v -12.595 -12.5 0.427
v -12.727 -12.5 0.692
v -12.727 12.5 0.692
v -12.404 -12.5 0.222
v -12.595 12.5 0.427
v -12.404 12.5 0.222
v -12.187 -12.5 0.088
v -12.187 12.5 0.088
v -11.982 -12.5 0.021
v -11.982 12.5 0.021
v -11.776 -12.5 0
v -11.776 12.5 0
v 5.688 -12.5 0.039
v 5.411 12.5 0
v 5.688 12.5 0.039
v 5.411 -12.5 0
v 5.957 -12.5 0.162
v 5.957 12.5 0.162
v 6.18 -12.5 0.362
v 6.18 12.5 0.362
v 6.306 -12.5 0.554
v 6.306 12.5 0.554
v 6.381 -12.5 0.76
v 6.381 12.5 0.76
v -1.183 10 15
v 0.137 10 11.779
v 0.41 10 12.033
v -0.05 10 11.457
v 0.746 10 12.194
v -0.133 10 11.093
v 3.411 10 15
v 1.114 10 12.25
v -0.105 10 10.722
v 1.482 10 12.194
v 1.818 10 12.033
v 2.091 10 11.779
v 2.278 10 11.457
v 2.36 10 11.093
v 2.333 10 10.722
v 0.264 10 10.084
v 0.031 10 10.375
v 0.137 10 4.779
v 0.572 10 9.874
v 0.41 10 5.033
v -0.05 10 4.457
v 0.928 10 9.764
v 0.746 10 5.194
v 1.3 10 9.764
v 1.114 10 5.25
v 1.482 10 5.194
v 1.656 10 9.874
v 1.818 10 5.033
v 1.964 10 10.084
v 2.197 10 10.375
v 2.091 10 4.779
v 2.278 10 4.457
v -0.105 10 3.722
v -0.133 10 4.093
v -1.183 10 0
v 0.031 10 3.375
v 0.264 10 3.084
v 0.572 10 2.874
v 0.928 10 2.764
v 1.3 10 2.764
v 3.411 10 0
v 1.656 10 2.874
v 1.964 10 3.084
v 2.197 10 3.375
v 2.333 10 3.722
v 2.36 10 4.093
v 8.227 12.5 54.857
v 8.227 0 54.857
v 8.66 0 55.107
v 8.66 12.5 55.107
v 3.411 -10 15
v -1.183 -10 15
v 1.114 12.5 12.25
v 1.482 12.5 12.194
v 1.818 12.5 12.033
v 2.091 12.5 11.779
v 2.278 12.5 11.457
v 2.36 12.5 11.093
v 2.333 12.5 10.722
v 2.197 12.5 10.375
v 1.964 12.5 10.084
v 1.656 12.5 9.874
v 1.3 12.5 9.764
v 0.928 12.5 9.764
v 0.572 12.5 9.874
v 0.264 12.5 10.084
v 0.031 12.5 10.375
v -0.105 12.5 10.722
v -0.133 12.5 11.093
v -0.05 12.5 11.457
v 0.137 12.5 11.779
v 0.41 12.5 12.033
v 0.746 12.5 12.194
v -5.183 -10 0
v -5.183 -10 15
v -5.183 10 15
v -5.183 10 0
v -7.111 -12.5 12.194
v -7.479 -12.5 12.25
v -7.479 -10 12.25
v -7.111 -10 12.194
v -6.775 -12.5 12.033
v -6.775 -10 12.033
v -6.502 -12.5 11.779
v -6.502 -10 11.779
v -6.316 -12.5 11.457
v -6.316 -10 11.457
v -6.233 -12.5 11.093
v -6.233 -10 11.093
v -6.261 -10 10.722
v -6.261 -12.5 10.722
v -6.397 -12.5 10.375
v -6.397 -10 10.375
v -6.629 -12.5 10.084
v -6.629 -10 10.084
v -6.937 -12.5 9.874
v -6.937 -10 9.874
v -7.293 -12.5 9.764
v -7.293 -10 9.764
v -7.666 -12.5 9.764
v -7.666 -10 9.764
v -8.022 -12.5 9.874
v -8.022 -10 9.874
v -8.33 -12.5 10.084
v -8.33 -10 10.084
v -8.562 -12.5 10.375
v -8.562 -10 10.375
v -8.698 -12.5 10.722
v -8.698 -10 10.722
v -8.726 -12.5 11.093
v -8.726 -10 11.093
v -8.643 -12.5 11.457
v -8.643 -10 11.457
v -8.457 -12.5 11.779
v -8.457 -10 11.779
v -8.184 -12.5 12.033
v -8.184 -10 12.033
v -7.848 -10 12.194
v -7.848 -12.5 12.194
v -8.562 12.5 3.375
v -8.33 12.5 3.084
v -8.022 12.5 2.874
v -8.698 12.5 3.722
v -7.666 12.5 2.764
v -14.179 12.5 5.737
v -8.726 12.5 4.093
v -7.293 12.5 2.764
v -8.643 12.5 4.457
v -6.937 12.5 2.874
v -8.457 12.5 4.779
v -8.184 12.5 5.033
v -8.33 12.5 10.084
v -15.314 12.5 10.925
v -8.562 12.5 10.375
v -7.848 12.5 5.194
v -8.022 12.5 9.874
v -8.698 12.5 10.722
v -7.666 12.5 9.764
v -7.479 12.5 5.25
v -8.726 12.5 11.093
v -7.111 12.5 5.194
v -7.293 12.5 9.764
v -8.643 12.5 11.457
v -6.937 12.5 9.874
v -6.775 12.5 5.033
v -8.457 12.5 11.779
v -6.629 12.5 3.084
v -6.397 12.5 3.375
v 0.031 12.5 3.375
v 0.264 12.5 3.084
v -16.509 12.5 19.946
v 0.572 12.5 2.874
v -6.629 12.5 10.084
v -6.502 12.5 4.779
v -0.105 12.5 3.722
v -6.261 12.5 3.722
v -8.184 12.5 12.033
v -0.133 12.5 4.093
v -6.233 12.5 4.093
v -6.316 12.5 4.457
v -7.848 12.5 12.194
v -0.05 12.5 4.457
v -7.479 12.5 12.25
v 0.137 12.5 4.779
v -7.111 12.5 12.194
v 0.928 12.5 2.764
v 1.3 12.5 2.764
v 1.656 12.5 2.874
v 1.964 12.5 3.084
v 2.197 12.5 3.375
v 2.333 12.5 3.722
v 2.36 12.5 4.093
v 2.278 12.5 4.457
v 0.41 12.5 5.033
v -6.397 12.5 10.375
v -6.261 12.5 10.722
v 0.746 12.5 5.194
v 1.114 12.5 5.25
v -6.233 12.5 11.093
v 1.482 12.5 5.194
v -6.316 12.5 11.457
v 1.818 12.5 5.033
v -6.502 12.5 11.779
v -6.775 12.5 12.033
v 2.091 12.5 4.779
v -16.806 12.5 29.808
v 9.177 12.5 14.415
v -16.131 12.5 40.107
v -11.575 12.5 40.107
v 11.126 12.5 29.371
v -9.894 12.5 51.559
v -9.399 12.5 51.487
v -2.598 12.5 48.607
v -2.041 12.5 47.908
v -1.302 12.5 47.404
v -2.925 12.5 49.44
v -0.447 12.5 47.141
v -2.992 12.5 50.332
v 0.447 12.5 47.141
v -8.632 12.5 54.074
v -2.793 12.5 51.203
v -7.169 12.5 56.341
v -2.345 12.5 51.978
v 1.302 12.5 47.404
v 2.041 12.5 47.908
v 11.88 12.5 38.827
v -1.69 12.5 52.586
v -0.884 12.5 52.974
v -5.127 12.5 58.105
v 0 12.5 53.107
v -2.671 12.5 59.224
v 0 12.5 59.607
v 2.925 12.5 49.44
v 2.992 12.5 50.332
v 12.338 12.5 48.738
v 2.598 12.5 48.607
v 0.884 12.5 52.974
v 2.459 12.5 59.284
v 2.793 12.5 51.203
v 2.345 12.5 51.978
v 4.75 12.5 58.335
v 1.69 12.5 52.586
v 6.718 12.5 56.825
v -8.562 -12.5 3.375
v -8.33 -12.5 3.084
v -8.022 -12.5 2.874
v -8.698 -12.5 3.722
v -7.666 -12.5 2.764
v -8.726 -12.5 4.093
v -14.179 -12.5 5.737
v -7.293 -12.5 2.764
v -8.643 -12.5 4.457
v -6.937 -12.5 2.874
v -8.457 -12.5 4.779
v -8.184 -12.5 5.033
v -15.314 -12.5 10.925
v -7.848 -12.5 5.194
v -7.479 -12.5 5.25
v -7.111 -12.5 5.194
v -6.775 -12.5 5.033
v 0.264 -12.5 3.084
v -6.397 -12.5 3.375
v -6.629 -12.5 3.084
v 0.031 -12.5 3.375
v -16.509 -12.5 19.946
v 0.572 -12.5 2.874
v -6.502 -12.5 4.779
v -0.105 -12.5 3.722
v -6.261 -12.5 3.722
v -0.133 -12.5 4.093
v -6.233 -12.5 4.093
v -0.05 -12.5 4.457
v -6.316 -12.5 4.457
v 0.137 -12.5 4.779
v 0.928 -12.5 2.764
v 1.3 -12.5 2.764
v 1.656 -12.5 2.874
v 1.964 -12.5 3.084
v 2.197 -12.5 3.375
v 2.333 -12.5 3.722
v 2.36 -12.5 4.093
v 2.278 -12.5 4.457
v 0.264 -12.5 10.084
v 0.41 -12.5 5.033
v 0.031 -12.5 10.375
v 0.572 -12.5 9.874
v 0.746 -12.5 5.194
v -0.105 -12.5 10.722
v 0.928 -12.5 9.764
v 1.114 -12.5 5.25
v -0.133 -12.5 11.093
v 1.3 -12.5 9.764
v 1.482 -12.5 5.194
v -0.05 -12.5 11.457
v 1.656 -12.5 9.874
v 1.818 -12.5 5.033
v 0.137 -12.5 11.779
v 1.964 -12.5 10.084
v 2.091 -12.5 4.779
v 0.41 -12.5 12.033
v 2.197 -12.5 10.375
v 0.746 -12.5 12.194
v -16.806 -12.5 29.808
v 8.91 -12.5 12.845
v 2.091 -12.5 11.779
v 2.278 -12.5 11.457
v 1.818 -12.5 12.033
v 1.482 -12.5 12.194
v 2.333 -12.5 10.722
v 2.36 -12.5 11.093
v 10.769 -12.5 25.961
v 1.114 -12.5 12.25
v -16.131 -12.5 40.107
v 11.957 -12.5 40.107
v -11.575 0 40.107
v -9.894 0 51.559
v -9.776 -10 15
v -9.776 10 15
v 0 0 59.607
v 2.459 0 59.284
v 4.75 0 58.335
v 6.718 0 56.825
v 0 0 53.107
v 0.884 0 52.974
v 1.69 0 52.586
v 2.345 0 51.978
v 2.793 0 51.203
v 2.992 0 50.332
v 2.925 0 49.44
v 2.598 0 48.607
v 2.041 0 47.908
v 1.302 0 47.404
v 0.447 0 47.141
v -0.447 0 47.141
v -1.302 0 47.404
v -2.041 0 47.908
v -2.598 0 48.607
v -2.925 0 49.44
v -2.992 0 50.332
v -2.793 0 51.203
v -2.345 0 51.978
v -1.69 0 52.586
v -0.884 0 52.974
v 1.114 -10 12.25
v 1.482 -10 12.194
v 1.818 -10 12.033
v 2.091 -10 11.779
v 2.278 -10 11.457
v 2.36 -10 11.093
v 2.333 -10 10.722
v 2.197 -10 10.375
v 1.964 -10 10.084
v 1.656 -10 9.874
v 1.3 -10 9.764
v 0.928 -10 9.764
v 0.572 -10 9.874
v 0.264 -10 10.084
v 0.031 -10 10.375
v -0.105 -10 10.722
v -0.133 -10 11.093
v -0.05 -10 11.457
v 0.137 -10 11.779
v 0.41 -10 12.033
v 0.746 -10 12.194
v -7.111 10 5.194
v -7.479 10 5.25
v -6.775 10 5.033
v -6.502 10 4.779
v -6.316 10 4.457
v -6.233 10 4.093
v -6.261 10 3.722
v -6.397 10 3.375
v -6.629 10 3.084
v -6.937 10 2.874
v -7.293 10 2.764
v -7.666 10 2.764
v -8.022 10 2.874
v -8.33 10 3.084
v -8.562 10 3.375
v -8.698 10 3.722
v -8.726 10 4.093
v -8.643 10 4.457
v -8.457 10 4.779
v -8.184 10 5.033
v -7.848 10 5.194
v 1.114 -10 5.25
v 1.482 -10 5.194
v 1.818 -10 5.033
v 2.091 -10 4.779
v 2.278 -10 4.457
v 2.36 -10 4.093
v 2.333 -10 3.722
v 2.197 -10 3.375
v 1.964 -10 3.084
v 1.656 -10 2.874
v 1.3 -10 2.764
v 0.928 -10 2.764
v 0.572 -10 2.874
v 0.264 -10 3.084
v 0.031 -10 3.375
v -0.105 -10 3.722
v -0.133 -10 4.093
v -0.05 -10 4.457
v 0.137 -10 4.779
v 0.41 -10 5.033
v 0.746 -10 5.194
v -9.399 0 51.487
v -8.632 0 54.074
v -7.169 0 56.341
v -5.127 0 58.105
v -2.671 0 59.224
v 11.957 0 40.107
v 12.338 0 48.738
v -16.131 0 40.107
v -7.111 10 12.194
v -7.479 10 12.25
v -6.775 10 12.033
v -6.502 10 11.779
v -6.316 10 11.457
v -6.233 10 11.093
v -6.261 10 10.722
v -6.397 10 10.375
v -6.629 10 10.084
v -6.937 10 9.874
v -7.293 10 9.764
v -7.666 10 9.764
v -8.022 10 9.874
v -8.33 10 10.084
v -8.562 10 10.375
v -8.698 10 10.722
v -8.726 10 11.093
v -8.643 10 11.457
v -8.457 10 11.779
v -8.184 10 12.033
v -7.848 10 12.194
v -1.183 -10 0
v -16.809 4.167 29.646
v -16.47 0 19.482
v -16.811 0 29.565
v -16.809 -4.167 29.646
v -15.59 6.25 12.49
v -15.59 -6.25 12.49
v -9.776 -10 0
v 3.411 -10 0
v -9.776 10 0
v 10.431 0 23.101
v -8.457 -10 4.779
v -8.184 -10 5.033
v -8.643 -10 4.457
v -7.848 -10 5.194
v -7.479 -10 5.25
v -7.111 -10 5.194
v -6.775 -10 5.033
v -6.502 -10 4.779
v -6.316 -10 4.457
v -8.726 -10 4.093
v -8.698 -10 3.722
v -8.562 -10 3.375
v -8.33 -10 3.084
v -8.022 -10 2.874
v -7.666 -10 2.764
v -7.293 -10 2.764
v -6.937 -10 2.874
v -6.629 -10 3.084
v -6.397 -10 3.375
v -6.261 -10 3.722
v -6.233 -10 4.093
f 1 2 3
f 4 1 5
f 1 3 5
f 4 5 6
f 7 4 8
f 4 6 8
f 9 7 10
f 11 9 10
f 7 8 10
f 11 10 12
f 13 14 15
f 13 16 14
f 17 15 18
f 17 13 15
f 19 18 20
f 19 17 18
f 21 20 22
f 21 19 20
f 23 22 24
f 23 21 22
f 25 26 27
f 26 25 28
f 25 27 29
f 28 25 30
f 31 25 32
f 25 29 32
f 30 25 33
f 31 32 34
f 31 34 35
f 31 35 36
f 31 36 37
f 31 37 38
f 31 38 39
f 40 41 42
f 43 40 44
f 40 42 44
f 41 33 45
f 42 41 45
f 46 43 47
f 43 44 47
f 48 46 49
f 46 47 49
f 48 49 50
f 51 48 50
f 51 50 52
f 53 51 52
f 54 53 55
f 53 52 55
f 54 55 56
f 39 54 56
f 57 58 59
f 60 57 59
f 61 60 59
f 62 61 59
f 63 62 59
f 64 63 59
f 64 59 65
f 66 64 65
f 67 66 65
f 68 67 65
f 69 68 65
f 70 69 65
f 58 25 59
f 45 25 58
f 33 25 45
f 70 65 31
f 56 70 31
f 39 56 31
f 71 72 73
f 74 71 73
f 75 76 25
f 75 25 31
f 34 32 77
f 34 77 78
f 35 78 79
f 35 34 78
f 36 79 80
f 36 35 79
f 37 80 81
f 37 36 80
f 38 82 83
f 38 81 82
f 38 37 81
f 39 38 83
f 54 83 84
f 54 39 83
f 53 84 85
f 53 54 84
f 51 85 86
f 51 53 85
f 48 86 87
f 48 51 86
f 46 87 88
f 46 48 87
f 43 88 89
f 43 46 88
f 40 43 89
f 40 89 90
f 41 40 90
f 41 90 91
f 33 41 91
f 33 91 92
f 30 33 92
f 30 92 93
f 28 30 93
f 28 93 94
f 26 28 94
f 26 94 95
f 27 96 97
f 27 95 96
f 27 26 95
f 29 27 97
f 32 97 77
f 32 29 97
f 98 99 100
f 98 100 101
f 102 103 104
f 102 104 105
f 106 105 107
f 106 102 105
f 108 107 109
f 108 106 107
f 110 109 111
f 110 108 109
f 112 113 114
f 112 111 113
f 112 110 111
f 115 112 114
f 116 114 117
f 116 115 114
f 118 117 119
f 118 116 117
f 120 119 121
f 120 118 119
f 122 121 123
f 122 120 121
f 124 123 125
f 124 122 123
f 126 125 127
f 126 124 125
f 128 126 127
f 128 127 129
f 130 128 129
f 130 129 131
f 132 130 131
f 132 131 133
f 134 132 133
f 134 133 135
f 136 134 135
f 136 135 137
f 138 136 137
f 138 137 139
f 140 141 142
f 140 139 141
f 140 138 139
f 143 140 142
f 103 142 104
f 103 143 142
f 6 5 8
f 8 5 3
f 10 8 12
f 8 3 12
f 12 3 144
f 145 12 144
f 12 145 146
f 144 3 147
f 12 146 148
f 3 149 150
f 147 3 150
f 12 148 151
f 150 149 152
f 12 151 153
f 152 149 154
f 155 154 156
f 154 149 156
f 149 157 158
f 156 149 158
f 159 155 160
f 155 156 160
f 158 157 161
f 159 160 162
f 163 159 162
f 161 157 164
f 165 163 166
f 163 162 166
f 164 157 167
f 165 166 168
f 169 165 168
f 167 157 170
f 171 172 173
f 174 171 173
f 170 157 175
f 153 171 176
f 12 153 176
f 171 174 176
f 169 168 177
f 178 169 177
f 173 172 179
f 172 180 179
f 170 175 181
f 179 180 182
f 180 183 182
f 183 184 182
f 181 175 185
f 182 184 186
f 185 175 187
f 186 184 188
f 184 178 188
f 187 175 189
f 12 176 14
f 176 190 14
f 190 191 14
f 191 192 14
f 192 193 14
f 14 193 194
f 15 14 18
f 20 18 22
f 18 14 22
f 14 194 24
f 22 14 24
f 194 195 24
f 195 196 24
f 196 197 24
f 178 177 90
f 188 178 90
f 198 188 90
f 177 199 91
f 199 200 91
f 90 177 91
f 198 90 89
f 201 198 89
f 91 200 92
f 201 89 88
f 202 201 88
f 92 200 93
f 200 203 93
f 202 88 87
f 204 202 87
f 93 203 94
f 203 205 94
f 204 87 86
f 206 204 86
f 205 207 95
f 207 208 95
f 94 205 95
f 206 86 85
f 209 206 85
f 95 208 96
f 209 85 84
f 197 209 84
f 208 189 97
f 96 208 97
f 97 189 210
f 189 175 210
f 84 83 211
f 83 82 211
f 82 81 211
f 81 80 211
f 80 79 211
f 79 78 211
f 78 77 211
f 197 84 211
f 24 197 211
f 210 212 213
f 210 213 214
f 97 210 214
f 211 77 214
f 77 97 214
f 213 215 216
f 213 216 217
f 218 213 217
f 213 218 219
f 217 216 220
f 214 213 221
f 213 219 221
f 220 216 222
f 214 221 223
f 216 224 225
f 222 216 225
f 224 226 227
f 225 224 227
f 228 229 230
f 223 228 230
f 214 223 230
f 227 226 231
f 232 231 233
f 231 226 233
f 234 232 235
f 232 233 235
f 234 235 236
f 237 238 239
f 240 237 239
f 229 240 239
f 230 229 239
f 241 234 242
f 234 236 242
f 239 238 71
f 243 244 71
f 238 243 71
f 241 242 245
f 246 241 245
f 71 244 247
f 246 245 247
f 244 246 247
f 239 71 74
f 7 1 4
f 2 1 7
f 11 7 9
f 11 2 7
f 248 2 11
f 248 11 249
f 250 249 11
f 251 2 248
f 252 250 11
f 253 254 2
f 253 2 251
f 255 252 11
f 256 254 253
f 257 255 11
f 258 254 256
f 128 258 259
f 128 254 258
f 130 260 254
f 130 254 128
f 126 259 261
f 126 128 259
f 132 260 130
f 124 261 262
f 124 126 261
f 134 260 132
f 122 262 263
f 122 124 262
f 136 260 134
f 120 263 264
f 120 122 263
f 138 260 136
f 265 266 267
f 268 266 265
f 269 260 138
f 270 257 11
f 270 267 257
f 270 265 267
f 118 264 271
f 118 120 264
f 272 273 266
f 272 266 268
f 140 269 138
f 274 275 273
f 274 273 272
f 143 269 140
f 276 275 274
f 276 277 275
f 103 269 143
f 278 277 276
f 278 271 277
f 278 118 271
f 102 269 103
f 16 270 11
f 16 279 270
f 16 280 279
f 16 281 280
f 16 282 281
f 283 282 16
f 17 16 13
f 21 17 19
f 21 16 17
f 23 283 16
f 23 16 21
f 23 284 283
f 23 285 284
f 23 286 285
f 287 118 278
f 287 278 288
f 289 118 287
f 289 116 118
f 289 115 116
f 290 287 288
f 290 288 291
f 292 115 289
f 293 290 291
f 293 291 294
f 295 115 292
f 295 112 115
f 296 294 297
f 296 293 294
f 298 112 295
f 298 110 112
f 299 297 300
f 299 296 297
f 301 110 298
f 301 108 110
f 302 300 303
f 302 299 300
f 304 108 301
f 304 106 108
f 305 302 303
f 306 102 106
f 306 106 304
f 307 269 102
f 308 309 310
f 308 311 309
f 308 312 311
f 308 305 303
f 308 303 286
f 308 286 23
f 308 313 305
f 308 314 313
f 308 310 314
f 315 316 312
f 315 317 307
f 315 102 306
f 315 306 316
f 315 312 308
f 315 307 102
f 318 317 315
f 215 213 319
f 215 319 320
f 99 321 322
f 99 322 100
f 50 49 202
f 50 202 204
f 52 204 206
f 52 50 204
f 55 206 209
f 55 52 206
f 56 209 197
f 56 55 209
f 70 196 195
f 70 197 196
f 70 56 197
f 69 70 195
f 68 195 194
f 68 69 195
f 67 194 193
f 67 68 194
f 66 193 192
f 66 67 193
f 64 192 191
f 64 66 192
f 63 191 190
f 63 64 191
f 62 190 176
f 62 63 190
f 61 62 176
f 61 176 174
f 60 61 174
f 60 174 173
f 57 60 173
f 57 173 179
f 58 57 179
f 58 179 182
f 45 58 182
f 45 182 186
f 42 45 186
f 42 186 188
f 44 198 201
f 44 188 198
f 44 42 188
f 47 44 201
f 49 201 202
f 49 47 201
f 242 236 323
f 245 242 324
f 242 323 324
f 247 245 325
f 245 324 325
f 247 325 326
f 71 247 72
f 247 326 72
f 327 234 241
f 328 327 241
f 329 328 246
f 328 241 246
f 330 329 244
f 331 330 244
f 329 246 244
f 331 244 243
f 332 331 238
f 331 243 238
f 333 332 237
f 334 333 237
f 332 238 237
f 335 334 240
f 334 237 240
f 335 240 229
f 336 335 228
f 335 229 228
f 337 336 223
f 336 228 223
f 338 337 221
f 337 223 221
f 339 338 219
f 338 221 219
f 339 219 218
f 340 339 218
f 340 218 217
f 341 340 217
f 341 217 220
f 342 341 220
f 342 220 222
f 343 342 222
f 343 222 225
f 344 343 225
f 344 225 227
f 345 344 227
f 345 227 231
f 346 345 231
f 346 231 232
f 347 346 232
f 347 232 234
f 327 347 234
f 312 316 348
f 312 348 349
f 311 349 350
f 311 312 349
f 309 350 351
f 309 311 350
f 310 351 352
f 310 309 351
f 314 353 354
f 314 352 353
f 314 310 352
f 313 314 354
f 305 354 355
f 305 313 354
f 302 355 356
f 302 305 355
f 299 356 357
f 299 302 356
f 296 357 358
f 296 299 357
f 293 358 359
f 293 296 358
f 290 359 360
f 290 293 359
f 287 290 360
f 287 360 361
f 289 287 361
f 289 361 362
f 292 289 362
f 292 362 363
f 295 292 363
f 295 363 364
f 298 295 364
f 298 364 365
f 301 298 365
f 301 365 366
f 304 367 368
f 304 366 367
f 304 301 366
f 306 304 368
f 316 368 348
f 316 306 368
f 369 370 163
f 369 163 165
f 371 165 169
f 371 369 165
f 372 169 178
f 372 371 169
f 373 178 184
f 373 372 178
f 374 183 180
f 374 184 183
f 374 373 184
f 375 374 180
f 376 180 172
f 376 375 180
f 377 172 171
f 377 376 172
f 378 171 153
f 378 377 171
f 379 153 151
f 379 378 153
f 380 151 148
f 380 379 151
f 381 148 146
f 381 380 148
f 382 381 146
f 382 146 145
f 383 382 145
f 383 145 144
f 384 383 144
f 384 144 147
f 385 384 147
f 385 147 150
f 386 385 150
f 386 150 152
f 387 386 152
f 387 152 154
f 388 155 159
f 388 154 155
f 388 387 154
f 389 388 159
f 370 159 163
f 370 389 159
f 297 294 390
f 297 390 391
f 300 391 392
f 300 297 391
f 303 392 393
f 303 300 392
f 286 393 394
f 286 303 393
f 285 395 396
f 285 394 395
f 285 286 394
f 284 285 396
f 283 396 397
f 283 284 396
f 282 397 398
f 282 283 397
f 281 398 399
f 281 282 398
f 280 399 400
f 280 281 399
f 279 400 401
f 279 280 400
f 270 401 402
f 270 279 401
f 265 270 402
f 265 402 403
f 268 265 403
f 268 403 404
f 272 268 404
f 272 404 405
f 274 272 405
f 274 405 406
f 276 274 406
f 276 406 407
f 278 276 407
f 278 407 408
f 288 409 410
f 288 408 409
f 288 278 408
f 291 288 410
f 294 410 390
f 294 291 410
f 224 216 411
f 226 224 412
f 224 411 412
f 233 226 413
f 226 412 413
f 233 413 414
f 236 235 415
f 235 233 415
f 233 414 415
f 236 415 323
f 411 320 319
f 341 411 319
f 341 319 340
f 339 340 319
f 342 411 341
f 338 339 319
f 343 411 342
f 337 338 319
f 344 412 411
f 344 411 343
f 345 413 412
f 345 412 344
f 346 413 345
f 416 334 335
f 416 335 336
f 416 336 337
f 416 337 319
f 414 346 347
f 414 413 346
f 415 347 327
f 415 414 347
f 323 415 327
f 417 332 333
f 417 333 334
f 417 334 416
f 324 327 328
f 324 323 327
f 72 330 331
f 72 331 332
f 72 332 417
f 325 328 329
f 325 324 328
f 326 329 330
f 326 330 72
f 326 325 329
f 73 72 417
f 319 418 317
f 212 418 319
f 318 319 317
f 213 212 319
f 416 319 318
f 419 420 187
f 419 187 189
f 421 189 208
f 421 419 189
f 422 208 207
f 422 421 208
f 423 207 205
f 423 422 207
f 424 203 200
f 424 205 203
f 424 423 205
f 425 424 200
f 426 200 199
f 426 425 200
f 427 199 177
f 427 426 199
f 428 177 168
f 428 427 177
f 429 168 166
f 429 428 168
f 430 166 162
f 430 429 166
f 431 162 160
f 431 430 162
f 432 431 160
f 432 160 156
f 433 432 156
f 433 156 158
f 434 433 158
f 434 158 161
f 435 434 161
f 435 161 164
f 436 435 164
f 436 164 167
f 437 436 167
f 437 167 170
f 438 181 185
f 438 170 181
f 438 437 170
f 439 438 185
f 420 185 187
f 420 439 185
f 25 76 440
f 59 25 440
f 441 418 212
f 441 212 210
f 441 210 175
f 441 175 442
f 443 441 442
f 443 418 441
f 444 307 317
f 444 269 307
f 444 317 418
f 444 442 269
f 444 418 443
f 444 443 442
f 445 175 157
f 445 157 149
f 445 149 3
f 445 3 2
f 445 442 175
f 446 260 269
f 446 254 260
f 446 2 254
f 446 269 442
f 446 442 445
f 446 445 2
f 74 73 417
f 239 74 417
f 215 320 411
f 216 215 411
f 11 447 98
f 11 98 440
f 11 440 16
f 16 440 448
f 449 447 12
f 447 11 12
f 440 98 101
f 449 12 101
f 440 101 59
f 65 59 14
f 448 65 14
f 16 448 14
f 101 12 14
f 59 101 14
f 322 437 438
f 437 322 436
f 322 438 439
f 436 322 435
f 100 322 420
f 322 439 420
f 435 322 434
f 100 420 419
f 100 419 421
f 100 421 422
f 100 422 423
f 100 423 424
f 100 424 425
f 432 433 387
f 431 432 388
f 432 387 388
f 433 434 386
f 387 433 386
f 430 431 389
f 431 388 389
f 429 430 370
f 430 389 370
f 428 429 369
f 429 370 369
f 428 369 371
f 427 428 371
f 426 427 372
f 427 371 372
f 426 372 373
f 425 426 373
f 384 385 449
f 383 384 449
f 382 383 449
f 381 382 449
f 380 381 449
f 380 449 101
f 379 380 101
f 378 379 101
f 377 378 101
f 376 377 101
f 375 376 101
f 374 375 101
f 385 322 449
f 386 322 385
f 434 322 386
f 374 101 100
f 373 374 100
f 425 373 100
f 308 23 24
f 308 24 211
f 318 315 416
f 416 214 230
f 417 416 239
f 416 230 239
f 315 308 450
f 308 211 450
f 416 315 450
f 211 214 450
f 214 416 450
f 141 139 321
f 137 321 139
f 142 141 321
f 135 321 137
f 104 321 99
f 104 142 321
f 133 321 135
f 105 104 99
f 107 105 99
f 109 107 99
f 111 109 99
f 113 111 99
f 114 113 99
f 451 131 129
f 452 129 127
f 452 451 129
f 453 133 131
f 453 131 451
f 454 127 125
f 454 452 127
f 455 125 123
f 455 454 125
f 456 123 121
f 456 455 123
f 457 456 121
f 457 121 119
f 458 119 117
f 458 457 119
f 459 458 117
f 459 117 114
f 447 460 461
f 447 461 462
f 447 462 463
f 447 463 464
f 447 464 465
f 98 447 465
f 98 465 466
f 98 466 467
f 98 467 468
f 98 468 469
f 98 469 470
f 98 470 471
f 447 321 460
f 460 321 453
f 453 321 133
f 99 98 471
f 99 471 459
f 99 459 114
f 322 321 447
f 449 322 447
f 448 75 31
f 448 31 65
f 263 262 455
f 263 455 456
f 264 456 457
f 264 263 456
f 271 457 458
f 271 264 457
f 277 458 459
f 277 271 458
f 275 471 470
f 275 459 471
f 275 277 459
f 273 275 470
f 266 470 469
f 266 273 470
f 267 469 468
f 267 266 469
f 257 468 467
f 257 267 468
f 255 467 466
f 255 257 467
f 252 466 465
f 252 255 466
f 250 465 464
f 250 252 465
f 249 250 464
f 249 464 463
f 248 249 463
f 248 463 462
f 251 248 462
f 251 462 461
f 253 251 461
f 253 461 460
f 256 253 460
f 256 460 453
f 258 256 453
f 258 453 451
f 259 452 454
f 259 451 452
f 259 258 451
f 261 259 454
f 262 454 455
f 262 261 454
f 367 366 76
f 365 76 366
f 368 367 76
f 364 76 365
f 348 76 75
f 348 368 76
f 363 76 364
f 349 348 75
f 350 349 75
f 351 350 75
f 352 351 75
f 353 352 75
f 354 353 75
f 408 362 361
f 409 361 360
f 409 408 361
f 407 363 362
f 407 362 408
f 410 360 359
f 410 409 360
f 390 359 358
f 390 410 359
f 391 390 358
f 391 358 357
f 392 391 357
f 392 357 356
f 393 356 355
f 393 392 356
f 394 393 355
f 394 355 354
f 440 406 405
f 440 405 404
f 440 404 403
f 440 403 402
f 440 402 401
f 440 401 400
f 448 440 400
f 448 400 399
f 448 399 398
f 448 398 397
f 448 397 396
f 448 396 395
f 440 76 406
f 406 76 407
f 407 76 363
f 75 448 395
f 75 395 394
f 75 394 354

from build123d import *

# Parameters (mm, degrees)
SKETCH_1_W               = 25
SKETCH_1_H               = 25
EXTRUDE_1_DEPTH          = 59.607324229
EXTRUDE_2_DEPTH          = 25
SKETCH_6_3_OUTSIDE_W     = 45.521
SKETCH_6_3_OUTSIDE_H     = 75.803
CUT_EXTRUDE_4_DEPTH      = 25
SKETCH_2_R               = 3
CUT_EXTRUDE_1_DEPTH      = 36.344532851
SKETCH_4_W               = 45.98037926
SKETCH_4_H               = 12.5
CUT_EXTRUDE_2_DEPTH      = 19.5
CUT_EXTRUDE_5_DEPTH      = 17
FILLET_1_R               = 1
CUT_EXTRUDE_6_DEPTH      = 22
CUT_EXTRUDE_6_DEPTH_BACK = 20
SKETCH_8_R               = 1.25
CUT_EXTRUDE_7_DEPTH      = 10
CUT_EXTRUDE_7_DEPTH_BACK = 10
SKETCH_8_3_W             = 4.593346614
SKETCH_8_3_H             = 15


with BuildPart() as part:
    # 스케치1 → 보스-돌출1 (new body)
    with BuildSketch(Plane.XY):
        Rectangle(SKETCH_1_W, SKETCH_1_H)
    extrude(amount=EXTRUDE_1_DEPTH)

    # 스케치6 → 보스-돌출2 (add)
    with BuildSketch(Plane.XZ.offset(12.5)):
        with BuildLine():
            add(Edge.make_bspline(
                [(-12.5, 59.607324229), (-21.149148663, 25.914705571), (-12.5, 0)],
                knots=[0, 0, 0, 1, 1, 1], degree=2))
            Line((-12.5, 0), (-12.5, 59.607324229))
        make_face()
    extrude(amount=-EXTRUDE_2_DEPTH)

    # 스케치6<3> outside → 컷-돌출4 (cut)
    with BuildSketch(Plane.XZ.offset(12.5)):
        with Locations((-2.1625, 29.8035)):
            Rectangle(SKETCH_6_3_OUTSIDE_W, SKETCH_6_3_OUTSIDE_H)
        with BuildLine():
            Line((-12.5, 0), (6.191304912, 0))
            add(Edge.make_bspline(
                [(6.191304912, 0), (12.5, 24.95352193), (12.5, 59.607324229)],
                knots=[0, 0, 0, 1, 1, 1], degree=2))
            Line((12.5, 59.607324229), (-12.5, 59.607324229))
            add(Edge.make_bspline(
                [(-12.5, 59.607324229), (-21.149148663, 25.914705571), (-12.5, 0)],
                knots=[0, 0, 0, 1, 1, 1], degree=2))
        make_face(mode=Mode.SUBTRACT)
    extrude(amount=-CUT_EXTRUDE_4_DEPTH, mode=Mode.SUBTRACT)

    # 스케치2 → 컷-돌출1 (cut)
    with BuildSketch(Plane(origin=(0, 12.5, 0), x_dir=(1, 0, 0), z_dir=(0, 1, 0))):
        with Locations((0, -50.107324229)):
            Circle(SKETCH_2_R)
    extrude(amount=-CUT_EXTRUDE_1_DEPTH, mode=Mode.SUBTRACT)

    # 스케치4 → 컷-돌출2 (cut)
    with BuildSketch(Plane.XY.offset(59.607324229)):
        with Locations((-3.730908459, -6.25)):
            Rectangle(SKETCH_4_W, SKETCH_4_H)
    extrude(amount=-CUT_EXTRUDE_2_DEPTH, mode=Mode.SUBTRACT)

    # 스케치7 → 컷-돌출5 (cut)
    with BuildSketch(Plane.XZ):
        with BuildLine():
            ThreePointArc((0, 59.607324229), (4.75, 58.334565565), (8.227241336, 54.857324229))
            Line((8.227241336, 54.857324229), (8.660254038, 55.107324229))
            Line((8.660254038, 55.107324229), (12.337626898, 48.737927596))
            add(Edge.make_bspline(
                [(12.337626898, 48.737927596), (12.5, 54.047793075), (12.5, 59.607324229)],
                knots=[0, 0, 0, 1, 1, 1], degree=2))
            Line((12.5, 59.607324229), (0, 59.607324229))
        make_face()
        with BuildLine():
            Line((-9.8940238, 51.559320455), (-9.39932261, 51.486720644))
            ThreePointArc((-9.39932261, 51.486720644), (-6.21070584, 57.296005121), (0, 59.607324229))
            Line((0, 59.607324229), (-12.5, 59.607324229))
            add(Edge.make_bspline(
                [(-12.5, 59.607324229), (-15.09259901, 49.507896739), (-16.130924903, 40.107324229)],
                knots=[0, 0, 0, 1, 1, 1], degree=2))
            Line((-16.130924903, 40.107324229), (-11.574660076, 40.107324229))
            Line((-11.574660076, 40.107324229), (-9.8940238, 51.559320455))
        make_face()
    extrude(amount=-CUT_EXTRUDE_5_DEPTH, mode=Mode.SUBTRACT)

    # 필렛1
    fillet_1_edges = [part.edges().sort_by_distance(p)[0] for p in [
        (6.191304912, 0, 0),
        (-12.5, 0, 0),
    ]]
    fillet(fillet_1_edges, radius=FILLET_1_R)

    # 스케치8 → 컷-돌출6 (cut, two sides: drawn at the far end of the back side and taken through both)
    with BuildSketch(Plane(origin=(0, 0, 0), x_dir=(1, 0, 0), z_dir=(0, 1, 0)).offset(-CUT_EXTRUDE_6_DEPTH_BACK)):
        with Locations((1.11398045, -4)):
            Circle(SKETCH_8_R)
        with Locations((1.11398045, -11)):
            Circle(SKETCH_8_R)
        with Locations((-7.479366164, -4)):
            Circle(SKETCH_8_R)
        with Locations((-7.479366164, -11)):
            Circle(SKETCH_8_R)
    extrude(amount=CUT_EXTRUDE_6_DEPTH + CUT_EXTRUDE_6_DEPTH_BACK, mode=Mode.SUBTRACT)

    # 스케치8<3> → 컷-돌출7 (cut, two sides: drawn at the far end of the back side and taken through both)
    with BuildSketch(Plane(origin=(0, 0, 0), x_dir=(1, 0, 0), z_dir=(0, 1, 0)).offset(-CUT_EXTRUDE_7_DEPTH_BACK)):
        with Locations((-7.479366164, -7.5)):
            Rectangle(SKETCH_8_3_W, SKETCH_8_3_H)
        with Locations((1.11398045, -7.5)):
            Rectangle(SKETCH_8_3_W, SKETCH_8_3_H)
    extrude(amount=CUT_EXTRUDE_7_DEPTH + CUT_EXTRUDE_7_DEPTH_BACK, mode=Mode.SUBTRACT)


solid = part.part
